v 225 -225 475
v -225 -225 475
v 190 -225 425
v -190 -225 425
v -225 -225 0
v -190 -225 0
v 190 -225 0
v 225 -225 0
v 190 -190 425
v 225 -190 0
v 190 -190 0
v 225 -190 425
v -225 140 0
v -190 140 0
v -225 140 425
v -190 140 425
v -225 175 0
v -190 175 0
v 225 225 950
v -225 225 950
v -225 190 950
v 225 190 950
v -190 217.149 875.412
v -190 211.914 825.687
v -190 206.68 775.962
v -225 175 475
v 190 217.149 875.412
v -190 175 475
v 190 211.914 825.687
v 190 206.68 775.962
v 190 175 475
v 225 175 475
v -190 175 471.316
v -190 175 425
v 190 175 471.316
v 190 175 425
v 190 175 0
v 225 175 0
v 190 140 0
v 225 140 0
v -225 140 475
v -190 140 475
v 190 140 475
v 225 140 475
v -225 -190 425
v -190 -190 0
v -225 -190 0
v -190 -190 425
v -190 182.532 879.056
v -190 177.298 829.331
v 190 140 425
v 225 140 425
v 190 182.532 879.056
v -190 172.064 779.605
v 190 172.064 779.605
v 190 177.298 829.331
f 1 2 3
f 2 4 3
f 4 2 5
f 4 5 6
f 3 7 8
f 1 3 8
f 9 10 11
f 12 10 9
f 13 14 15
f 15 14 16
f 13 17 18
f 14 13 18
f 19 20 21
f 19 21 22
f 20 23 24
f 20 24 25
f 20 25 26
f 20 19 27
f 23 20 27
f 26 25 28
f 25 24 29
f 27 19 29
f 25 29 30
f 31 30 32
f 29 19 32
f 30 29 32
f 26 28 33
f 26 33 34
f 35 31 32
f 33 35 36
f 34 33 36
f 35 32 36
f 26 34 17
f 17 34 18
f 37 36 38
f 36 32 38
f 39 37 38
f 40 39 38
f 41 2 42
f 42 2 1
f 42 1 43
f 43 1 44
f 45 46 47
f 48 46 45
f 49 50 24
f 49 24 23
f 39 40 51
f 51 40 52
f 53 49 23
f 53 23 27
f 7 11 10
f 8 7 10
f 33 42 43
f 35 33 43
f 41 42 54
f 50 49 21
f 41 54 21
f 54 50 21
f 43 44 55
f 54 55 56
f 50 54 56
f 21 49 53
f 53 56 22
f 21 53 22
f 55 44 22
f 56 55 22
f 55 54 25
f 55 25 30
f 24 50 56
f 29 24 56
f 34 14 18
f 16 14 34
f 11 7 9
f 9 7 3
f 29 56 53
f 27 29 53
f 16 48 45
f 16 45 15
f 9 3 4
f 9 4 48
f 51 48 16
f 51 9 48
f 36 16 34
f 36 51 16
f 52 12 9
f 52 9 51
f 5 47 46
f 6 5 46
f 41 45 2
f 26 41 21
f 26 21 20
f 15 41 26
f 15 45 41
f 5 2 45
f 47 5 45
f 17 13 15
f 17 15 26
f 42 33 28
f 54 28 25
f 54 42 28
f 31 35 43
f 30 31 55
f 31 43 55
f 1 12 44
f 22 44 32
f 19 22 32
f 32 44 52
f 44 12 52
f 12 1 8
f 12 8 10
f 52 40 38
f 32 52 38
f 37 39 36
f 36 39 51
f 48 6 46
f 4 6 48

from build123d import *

# Parameters (mm, degrees)
F0_W     = 450
F0_H     = 450
F1_DEPTH = 950
F2_W     = 50
F2_H     = 50
F2_H_2   = 425
F2_W_2   = 330
F3_DEPTH = 450.001
F4_W     = 380
F4_H     = 425
F5_DEPTH = 450.001
F6_W     = 380
F6_H     = 50
F6_H_2   = 306.2882968217
F7_DEPTH = 134.2592361444


with BuildPart() as f1:
    # F0 (on Top) → F1 (new body)
    with BuildSketch(Plane.XY):
        Rectangle(F0_W, F0_H)
    extrude(amount=F1_DEPTH)

    # F2 (on face) → F3 (cut, through all)
    with BuildSketch(Plane.YZ.offset(225)):
        Polygon((-225, 475), (140, 475), (190, 950), (-225, 950), align=None)
        Polygon((175, 475), (225, 475), (225, 950), align=None)
        with Locations((200, 450)):
            Rectangle(F2_W, F2_H)
        with Locations((200, 212.5)):
            Rectangle(F2_W, F2_H_2)
        with Locations((-25, 212.5)):
            Rectangle(F2_W_2, F2_H_2)
    extrude(amount=-F3_DEPTH, mode=Mode.SUBTRACT)

    # F4 (on face) → F5 (cut, through all)
    with BuildSketch(Plane.XZ.offset(225)):
        with Locations((0, 212.5)):
            Rectangle(F4_W, F4_H)
    extrude(amount=-F5_DEPTH, mode=Mode.SUBTRACT)

    # F6 (on face) → F7 (cut, through all)
    with BuildSketch(Plane(origin=(0, 89.0136986301, -9.3698630137), x_dir=(1, 0, 0), z_dir=(0, -0.9945054529, 0.1046847845))):
        with Locations((0, 868.3342567919)):
            Rectangle(F6_W, F6_H)
        with Locations((0, 640.190108381)):
            Rectangle(F6_W, F6_H_2)
    extrude(amount=-F7_DEPTH, mode=Mode.SUBTRACT)


solid = f1.part
